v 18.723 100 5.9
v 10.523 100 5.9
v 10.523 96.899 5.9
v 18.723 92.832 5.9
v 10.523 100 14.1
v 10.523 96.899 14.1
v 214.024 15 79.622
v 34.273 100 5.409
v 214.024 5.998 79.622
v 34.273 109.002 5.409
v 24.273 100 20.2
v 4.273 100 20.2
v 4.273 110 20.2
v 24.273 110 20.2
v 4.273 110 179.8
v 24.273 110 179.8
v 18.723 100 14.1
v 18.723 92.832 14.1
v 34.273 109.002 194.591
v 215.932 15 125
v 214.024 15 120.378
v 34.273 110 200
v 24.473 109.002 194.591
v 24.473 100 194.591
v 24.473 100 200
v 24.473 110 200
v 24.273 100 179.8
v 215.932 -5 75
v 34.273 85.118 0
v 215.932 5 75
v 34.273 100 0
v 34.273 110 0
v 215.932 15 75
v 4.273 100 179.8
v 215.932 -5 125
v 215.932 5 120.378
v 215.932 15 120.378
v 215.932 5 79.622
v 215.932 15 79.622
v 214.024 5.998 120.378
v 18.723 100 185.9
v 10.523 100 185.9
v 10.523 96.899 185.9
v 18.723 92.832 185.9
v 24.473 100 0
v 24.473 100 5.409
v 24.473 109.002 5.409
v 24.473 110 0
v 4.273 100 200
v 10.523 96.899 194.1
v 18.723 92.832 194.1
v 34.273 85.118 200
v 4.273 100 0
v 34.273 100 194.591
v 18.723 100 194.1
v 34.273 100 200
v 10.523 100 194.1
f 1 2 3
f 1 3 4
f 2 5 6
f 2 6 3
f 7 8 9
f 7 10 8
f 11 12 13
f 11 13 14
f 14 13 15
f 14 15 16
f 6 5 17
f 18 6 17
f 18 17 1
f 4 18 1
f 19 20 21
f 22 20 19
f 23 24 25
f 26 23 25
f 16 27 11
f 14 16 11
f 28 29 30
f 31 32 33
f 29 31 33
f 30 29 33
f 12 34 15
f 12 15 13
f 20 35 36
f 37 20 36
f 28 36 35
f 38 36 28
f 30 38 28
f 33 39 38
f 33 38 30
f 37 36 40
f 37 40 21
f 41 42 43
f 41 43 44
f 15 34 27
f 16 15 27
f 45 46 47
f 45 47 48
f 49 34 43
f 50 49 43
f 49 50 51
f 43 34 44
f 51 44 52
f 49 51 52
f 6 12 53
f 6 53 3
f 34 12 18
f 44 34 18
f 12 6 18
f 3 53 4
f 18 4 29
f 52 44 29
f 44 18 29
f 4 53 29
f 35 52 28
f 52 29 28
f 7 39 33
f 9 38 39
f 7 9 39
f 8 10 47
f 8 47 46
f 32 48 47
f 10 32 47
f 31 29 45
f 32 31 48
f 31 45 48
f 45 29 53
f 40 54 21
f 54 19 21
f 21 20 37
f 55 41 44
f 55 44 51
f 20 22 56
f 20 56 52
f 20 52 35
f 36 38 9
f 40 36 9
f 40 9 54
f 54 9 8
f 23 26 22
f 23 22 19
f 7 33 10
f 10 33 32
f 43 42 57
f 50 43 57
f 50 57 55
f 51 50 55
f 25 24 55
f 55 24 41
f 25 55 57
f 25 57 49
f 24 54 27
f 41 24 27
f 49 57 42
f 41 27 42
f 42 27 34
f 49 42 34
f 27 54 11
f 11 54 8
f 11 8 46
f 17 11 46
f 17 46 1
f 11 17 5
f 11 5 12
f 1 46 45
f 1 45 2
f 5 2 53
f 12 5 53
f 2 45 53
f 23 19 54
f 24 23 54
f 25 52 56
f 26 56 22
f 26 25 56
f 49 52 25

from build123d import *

# Parameters (mm, degrees)
SALIENTE_EXTRUIR1_DEPTH  = 200
CROQUIS2_W               = 8.2
CROQUIS2_H               = 8.2
CORTAR_EXTRUIR1_DEPTH    = 200
CORTAR_EXTRUIR3_DEPTH    = 313.49262378
SALIENTE_EXTRUIR3_DEPTH  = 5
SALIENTE_EXTRUIR4_REACH  = 313.287
CROQUIS10_W              = 4.621603975
CROQUIS10_H              = 10
CROQUIS11_W              = 20
CROQUIS11_H              = 159.6
SALIENTE_EXTRUIR6_DEPTH  = 10
CORTAR_EXTRUIR4_DEPTH    = 313.49262378
SALIENTE_EXTRUIR10_REACH = 299.92


with BuildPart() as part:
    # Croquis1 → Saliente-Extruir1 (new body)
    with BuildSketch(Plane.XY):
        Polygon((4.273004903, 100), (215.932026149, -5), (215.932026149, 5), (34.273004903, 100), align=None)
    extrude(amount=SALIENTE_EXTRUIR1_DEPTH)

    # Croquis2 → Cortar-Extruir1 (cut)
    with BuildSketch(Plane(origin=(0, 100, 0), x_dir=(1, 0, 0), z_dir=(0, 1, 0))):
        with Locations((14.623004903, -10)):
            Rectangle(CROQUIS2_W, CROQUIS2_H)
    cortar_extruir1 = extrude(amount=-CORTAR_EXTRUIR1_DEPTH, mode=Mode.SUBTRACT)

    # Croquis8 → Cortar-Extruir3 (cut, through all)
    with BuildSketch(Plane(origin=(0, 100, 0), x_dir=(1, 0, 0), z_dir=(0, 1, 0))):
        Polygon((34.273004903, -200), (215.932026149, -200), (215.932026149, -125), align=None)
        Polygon((215.932026149, -75), (215.932026149, 0), (34.273004903, 0), align=None)
    extrude(amount=-CORTAR_EXTRUIR3_DEPTH, mode=Mode.SUBTRACT)

    # Croquis9 → Saliente-Extruir3 (add)
    with BuildSketch(Plane(origin=(4.991214306, 0, -12.08932141), x_dir=(-0.9243207949834489, 0, -0.3816163884860884), z_dir=(0.38161638848608836, 0, -0.9243207949834488))):
        Polygon((-228.211691209, 5), (-228.211691209, 15), (-31.679251139, 110), (-31.679251139, 100), align=None)
    saliente_extruir3 = extrude(amount=-SALIENTE_EXTRUIR3_DEPTH)

    # Simetría2: Saliente-Extruir3 across plane
    add(saliente_extruir3.mirror(Plane.XY.offset(100)))

    # Croquis10 → Saliente-Extruir4 (add, up to next)
    with BuildSketch(Plane(origin=(215.932026149, 0, 0), x_dir=(0, 0, -1), z_dir=(1, 0, 0)), mode=Mode.PRIVATE) as saliente_extruir4_sk1:
        with Locations((-122.689198013, 10)):
            Rectangle(CROQUIS10_W, CROQUIS10_H)
    saliente_extruir4_tool1 = extrude(saliente_extruir4_sk1.sketch, amount=-SALIENTE_EXTRUIR4_REACH, mode=Mode.PRIVATE) - part.part
    # Croquis10 → Saliente-Extruir4 (add, up to next)
    with BuildSketch(Plane(origin=(215.932026149, 0, 0), x_dir=(0, 0, -1), z_dir=(1, 0, 0)), mode=Mode.PRIVATE) as saliente_extruir4_sk2:
        with Locations((-77.310801987, 10)):
            Rectangle(CROQUIS10_W, CROQUIS10_H)
    saliente_extruir4_tool2 = extrude(saliente_extruir4_sk2.sketch, amount=-SALIENTE_EXTRUIR4_REACH, mode=Mode.PRIVATE) - part.part
    add(saliente_extruir4_tool1.solids().sort_by_distance((215.932026, 10, 122.689198))[0])
    add(saliente_extruir4_tool2.solids().sort_by_distance((215.932026, 10, 77.310802))[0])

    # Croquis11 → Saliente-Extruir6 (add)
    with BuildSketch(Plane(origin=(0, 100, 0), x_dir=(1, 0, 0), z_dir=(0, 1, 0))):
        with Locations((14.273004903, -100)):
            Rectangle(CROQUIS11_W, CROQUIS11_H)
    extrude(amount=SALIENTE_EXTRUIR6_DEPTH)

    # Croquis12 → Cortar-Extruir4 (cut, through all)
    with BuildSketch(Plane(origin=(0, 100, 0), x_dir=(1, 0, 0), z_dir=(0, 1, 0))):
        Polygon((34.273004903, -200), (34.273004903, -194.59062262), (32.364922961, -195.378396025), align=None)
    cortar_extruir4 = extrude(amount=CORTAR_EXTRUIR4_DEPTH, mode=Mode.SUBTRACT)

    # Simetría3: Cortar-Extruir4 across plane
    add(cortar_extruir4.mirror(Plane.XY.offset(100)), mode=Mode.SUBTRACT)

    # Simetría5: Cortar-Extruir1 across plane
    add(cortar_extruir1.mirror(Plane.XY.offset(100)), mode=Mode.SUBTRACT)

    # Croquis17 → Saliente-Extruir10 (add, up to next)
    with BuildSketch(Plane.ZY.offset(-24.473004903), mode=Mode.PRIVATE) as saliente_extruir10_sk1:
        Polygon((194.59062262, 109.002153687), (194.59062262, 100), (200, 100), (200, 110), align=None)
    saliente_extruir10_tool1 = extrude(saliente_extruir10_sk1.sketch, amount=-SALIENTE_EXTRUIR10_REACH, mode=Mode.PRIVATE) - part.part
    saliente_extruir10 = saliente_extruir10_tool1.solids().sort_by_distance((24.473005, 104.754905, 197.342654))[0]
    add(saliente_extruir10)

    # Simetría6: Saliente-Extruir10 across plane
    add(saliente_extruir10.mirror(Plane.XY.offset(100)))


solid = part.part
